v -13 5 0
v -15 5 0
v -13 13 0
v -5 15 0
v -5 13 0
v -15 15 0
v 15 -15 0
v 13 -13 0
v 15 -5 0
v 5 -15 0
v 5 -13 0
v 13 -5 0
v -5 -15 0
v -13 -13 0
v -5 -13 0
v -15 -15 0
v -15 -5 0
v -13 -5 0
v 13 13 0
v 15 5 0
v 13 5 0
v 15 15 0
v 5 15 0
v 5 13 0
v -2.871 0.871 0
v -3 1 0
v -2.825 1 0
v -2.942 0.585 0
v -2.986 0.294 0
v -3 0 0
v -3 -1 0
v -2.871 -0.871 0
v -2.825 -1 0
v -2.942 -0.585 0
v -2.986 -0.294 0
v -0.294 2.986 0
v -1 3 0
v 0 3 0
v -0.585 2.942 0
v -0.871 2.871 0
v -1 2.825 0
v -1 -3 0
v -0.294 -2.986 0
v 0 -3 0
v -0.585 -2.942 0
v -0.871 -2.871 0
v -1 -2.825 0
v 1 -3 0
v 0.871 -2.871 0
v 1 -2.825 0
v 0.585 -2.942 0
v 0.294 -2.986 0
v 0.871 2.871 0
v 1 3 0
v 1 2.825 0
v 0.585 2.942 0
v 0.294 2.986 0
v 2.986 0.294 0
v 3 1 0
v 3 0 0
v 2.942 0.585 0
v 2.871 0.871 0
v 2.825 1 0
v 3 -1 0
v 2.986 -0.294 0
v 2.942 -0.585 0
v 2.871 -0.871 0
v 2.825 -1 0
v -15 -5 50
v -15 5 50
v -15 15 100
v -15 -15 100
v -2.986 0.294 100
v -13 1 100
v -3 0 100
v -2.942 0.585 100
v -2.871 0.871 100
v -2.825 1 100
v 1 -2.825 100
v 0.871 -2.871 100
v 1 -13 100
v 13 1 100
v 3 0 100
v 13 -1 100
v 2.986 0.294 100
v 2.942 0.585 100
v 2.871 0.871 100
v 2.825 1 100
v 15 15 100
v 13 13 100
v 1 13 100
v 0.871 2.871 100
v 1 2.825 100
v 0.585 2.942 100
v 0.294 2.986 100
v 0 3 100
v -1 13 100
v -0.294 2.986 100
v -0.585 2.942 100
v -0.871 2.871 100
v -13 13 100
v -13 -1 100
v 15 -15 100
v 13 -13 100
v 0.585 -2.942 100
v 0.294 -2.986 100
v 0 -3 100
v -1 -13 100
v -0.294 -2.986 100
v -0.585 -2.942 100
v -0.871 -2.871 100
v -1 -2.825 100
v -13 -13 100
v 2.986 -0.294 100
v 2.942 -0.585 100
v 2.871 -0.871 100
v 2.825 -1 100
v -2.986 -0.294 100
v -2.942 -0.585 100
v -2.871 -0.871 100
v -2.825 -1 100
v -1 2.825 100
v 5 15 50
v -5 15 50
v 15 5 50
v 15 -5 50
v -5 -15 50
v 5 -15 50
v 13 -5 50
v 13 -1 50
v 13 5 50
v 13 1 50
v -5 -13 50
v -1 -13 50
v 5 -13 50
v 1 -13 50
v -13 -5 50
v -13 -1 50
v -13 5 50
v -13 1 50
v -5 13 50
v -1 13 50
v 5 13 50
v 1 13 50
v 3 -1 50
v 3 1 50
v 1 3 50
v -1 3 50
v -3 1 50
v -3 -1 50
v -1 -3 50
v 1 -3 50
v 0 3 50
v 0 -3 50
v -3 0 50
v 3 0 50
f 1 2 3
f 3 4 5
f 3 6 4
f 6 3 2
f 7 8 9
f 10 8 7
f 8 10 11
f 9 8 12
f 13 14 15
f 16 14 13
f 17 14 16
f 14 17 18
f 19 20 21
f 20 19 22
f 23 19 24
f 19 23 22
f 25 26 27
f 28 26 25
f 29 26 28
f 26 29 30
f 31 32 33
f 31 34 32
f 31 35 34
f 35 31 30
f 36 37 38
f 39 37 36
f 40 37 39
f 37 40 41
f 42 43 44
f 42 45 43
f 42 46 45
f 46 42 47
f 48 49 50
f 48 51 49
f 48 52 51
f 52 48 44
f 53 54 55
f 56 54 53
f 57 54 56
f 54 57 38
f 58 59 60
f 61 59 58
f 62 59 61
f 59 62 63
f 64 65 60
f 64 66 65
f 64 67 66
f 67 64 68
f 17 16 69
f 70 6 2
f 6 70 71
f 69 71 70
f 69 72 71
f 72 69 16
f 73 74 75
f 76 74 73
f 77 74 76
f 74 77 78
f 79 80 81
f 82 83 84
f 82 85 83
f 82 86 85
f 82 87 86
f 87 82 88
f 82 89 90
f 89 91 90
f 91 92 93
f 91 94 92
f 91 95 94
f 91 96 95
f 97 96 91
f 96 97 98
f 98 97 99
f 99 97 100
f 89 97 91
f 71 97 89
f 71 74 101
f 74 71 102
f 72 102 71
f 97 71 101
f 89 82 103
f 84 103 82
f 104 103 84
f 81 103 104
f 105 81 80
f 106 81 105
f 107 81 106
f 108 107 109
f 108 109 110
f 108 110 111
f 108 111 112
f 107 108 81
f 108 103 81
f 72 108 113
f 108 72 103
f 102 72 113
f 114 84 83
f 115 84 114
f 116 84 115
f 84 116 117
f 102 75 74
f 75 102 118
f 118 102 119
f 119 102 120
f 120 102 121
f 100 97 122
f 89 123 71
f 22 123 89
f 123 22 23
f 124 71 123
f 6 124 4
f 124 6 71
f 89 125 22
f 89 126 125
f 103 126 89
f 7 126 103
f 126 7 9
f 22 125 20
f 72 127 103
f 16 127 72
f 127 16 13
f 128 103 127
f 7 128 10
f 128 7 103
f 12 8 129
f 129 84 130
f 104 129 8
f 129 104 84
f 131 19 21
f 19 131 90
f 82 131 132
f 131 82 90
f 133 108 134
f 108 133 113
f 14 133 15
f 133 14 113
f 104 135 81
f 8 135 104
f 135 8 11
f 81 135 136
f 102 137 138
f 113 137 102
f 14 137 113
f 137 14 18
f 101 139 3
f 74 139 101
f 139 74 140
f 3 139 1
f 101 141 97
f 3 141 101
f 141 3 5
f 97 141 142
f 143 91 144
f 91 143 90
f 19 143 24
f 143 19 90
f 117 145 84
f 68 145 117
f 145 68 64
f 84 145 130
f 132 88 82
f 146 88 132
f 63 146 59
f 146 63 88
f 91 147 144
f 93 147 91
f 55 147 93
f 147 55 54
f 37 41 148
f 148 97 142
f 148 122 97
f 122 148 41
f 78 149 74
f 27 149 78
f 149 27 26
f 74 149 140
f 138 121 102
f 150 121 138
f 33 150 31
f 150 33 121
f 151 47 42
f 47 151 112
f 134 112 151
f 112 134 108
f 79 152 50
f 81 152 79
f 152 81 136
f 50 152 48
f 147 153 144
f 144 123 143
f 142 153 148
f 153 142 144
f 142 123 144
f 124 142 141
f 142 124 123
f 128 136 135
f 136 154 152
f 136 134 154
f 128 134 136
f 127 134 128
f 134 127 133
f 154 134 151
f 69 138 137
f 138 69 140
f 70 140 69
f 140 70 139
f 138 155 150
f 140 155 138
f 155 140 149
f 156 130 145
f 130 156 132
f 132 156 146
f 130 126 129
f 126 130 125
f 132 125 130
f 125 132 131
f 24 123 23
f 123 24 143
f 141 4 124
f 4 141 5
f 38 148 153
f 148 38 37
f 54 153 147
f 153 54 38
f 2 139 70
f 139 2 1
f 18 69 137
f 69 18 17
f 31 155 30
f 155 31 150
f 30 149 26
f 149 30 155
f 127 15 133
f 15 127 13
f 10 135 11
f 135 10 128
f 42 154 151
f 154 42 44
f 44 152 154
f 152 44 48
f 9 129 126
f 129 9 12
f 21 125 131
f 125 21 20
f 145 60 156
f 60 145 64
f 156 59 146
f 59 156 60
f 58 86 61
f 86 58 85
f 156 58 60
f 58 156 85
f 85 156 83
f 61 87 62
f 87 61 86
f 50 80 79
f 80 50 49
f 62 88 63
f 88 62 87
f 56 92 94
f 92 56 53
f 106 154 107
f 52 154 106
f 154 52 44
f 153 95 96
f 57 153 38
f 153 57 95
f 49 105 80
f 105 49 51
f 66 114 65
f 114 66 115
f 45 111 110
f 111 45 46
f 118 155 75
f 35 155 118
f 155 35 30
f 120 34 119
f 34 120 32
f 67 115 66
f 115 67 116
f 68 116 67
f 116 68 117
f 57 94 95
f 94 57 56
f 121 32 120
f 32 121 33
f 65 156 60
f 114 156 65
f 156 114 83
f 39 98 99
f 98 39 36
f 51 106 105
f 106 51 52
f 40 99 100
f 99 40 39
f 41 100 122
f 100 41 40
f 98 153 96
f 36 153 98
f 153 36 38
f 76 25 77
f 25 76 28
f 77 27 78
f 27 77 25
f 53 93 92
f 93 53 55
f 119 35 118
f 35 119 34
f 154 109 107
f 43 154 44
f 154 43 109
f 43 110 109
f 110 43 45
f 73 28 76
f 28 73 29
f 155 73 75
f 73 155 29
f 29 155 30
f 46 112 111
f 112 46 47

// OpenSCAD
$fn = 64;

size = 30.0;     // mm
length = 100.0;  // mm

// Simple 30x30 aluminum extrusion-like profile (solid outer with central bore and 4 T-slots)
module extrusion_3030(len=100, s=30) {
    wall = 2.0;          // outer wall thickness
    bore_d = 6.0;        // central bore diameter
    slot_w = 6.0;        // slot opening width at surface
    slot_depth = 8.0;    // slot depth from surface inward
    slot_inner_w = 10.0; // widened cavity width inside
    slot_inner_depth = 12.0;

    difference() {
        // Outer body
        linear_extrude(height=len, center=false)
            square([s, s], center=true);

        // Central bore
        translate([0, 0, -0.1])
            cylinder(h=len+0.2, d=bore_d, center=false);

        // Hollow out interior slightly (keeps walls)
        translate([0, 0, -0.1])
            linear_extrude(height=len+0.2, center=false)
                offset(delta=-wall)
                    square([s, s], center=true);

        // Add back a cross web (so it's not fully hollow)
        // (We subtract hollow, then re-add webs by subtracting less: easiest is to subtract slots only;
        // so instead, we "unhollow" by leaving webs via not hollowing fully. We'll do it by adding material later.)
    }

    // Re-add internal cross webs
    // (Union with the hollowed body above)
    union() {
        // The hollowed body already exists from difference(); we need to include it:
        // In , we can't reference prior geometry, so we rebuild with union/difference properly.
    }
}

// Rebuild properly with union/difference
module extrusion_3030_full(len=100, s=30) {
    wall = 2.0;
    bore_d = 6.0;
    slot_w = 6.0;
    slot_depth = 8.0;
    slot_inner_w = 10.0;
    slot_inner_depth = 12.0;
    web = 2.0;

    difference() {
        union() {
            // Outer shell
            difference() {
                linear_extrude(height=len)
                    square([s, s], center=true);

                translate([0, 0, -0.1])
                    linear_extrude(height=len+0.2)
                        offset(delta=-wall)
                            square([s, s], center=true);
            }

            // Internal cross webs
            linear_extrude(height=len)
                union() {
                    square([web, s - 2*wall], center=true);
                    square([s - 2*wall, web], center=true);
                }
        }

        // Central bore
        translate([0, 0, -0.1])
            cylinder(h=len+0.2, d=bore_d);

        // Four T-slots
        for (a = [0, 90, 180, 270]) {
            rotate([0, 0, a]) {
                // Slot opening from surface inward
                translate([0, (s/2) - slot_depth/2, -0.1])
                    cube([slot_w, slot_depth, len+0.2], center=true);

                // Inner widened cavity
                translate([0, (s/2) - slot_inner_depth/2, -0.1])
                    cube([slot_inner_w, slot_inner_depth, len+0.2], center=true);
            }
        }
    }
}

extrusion_3030_full(length, size);
